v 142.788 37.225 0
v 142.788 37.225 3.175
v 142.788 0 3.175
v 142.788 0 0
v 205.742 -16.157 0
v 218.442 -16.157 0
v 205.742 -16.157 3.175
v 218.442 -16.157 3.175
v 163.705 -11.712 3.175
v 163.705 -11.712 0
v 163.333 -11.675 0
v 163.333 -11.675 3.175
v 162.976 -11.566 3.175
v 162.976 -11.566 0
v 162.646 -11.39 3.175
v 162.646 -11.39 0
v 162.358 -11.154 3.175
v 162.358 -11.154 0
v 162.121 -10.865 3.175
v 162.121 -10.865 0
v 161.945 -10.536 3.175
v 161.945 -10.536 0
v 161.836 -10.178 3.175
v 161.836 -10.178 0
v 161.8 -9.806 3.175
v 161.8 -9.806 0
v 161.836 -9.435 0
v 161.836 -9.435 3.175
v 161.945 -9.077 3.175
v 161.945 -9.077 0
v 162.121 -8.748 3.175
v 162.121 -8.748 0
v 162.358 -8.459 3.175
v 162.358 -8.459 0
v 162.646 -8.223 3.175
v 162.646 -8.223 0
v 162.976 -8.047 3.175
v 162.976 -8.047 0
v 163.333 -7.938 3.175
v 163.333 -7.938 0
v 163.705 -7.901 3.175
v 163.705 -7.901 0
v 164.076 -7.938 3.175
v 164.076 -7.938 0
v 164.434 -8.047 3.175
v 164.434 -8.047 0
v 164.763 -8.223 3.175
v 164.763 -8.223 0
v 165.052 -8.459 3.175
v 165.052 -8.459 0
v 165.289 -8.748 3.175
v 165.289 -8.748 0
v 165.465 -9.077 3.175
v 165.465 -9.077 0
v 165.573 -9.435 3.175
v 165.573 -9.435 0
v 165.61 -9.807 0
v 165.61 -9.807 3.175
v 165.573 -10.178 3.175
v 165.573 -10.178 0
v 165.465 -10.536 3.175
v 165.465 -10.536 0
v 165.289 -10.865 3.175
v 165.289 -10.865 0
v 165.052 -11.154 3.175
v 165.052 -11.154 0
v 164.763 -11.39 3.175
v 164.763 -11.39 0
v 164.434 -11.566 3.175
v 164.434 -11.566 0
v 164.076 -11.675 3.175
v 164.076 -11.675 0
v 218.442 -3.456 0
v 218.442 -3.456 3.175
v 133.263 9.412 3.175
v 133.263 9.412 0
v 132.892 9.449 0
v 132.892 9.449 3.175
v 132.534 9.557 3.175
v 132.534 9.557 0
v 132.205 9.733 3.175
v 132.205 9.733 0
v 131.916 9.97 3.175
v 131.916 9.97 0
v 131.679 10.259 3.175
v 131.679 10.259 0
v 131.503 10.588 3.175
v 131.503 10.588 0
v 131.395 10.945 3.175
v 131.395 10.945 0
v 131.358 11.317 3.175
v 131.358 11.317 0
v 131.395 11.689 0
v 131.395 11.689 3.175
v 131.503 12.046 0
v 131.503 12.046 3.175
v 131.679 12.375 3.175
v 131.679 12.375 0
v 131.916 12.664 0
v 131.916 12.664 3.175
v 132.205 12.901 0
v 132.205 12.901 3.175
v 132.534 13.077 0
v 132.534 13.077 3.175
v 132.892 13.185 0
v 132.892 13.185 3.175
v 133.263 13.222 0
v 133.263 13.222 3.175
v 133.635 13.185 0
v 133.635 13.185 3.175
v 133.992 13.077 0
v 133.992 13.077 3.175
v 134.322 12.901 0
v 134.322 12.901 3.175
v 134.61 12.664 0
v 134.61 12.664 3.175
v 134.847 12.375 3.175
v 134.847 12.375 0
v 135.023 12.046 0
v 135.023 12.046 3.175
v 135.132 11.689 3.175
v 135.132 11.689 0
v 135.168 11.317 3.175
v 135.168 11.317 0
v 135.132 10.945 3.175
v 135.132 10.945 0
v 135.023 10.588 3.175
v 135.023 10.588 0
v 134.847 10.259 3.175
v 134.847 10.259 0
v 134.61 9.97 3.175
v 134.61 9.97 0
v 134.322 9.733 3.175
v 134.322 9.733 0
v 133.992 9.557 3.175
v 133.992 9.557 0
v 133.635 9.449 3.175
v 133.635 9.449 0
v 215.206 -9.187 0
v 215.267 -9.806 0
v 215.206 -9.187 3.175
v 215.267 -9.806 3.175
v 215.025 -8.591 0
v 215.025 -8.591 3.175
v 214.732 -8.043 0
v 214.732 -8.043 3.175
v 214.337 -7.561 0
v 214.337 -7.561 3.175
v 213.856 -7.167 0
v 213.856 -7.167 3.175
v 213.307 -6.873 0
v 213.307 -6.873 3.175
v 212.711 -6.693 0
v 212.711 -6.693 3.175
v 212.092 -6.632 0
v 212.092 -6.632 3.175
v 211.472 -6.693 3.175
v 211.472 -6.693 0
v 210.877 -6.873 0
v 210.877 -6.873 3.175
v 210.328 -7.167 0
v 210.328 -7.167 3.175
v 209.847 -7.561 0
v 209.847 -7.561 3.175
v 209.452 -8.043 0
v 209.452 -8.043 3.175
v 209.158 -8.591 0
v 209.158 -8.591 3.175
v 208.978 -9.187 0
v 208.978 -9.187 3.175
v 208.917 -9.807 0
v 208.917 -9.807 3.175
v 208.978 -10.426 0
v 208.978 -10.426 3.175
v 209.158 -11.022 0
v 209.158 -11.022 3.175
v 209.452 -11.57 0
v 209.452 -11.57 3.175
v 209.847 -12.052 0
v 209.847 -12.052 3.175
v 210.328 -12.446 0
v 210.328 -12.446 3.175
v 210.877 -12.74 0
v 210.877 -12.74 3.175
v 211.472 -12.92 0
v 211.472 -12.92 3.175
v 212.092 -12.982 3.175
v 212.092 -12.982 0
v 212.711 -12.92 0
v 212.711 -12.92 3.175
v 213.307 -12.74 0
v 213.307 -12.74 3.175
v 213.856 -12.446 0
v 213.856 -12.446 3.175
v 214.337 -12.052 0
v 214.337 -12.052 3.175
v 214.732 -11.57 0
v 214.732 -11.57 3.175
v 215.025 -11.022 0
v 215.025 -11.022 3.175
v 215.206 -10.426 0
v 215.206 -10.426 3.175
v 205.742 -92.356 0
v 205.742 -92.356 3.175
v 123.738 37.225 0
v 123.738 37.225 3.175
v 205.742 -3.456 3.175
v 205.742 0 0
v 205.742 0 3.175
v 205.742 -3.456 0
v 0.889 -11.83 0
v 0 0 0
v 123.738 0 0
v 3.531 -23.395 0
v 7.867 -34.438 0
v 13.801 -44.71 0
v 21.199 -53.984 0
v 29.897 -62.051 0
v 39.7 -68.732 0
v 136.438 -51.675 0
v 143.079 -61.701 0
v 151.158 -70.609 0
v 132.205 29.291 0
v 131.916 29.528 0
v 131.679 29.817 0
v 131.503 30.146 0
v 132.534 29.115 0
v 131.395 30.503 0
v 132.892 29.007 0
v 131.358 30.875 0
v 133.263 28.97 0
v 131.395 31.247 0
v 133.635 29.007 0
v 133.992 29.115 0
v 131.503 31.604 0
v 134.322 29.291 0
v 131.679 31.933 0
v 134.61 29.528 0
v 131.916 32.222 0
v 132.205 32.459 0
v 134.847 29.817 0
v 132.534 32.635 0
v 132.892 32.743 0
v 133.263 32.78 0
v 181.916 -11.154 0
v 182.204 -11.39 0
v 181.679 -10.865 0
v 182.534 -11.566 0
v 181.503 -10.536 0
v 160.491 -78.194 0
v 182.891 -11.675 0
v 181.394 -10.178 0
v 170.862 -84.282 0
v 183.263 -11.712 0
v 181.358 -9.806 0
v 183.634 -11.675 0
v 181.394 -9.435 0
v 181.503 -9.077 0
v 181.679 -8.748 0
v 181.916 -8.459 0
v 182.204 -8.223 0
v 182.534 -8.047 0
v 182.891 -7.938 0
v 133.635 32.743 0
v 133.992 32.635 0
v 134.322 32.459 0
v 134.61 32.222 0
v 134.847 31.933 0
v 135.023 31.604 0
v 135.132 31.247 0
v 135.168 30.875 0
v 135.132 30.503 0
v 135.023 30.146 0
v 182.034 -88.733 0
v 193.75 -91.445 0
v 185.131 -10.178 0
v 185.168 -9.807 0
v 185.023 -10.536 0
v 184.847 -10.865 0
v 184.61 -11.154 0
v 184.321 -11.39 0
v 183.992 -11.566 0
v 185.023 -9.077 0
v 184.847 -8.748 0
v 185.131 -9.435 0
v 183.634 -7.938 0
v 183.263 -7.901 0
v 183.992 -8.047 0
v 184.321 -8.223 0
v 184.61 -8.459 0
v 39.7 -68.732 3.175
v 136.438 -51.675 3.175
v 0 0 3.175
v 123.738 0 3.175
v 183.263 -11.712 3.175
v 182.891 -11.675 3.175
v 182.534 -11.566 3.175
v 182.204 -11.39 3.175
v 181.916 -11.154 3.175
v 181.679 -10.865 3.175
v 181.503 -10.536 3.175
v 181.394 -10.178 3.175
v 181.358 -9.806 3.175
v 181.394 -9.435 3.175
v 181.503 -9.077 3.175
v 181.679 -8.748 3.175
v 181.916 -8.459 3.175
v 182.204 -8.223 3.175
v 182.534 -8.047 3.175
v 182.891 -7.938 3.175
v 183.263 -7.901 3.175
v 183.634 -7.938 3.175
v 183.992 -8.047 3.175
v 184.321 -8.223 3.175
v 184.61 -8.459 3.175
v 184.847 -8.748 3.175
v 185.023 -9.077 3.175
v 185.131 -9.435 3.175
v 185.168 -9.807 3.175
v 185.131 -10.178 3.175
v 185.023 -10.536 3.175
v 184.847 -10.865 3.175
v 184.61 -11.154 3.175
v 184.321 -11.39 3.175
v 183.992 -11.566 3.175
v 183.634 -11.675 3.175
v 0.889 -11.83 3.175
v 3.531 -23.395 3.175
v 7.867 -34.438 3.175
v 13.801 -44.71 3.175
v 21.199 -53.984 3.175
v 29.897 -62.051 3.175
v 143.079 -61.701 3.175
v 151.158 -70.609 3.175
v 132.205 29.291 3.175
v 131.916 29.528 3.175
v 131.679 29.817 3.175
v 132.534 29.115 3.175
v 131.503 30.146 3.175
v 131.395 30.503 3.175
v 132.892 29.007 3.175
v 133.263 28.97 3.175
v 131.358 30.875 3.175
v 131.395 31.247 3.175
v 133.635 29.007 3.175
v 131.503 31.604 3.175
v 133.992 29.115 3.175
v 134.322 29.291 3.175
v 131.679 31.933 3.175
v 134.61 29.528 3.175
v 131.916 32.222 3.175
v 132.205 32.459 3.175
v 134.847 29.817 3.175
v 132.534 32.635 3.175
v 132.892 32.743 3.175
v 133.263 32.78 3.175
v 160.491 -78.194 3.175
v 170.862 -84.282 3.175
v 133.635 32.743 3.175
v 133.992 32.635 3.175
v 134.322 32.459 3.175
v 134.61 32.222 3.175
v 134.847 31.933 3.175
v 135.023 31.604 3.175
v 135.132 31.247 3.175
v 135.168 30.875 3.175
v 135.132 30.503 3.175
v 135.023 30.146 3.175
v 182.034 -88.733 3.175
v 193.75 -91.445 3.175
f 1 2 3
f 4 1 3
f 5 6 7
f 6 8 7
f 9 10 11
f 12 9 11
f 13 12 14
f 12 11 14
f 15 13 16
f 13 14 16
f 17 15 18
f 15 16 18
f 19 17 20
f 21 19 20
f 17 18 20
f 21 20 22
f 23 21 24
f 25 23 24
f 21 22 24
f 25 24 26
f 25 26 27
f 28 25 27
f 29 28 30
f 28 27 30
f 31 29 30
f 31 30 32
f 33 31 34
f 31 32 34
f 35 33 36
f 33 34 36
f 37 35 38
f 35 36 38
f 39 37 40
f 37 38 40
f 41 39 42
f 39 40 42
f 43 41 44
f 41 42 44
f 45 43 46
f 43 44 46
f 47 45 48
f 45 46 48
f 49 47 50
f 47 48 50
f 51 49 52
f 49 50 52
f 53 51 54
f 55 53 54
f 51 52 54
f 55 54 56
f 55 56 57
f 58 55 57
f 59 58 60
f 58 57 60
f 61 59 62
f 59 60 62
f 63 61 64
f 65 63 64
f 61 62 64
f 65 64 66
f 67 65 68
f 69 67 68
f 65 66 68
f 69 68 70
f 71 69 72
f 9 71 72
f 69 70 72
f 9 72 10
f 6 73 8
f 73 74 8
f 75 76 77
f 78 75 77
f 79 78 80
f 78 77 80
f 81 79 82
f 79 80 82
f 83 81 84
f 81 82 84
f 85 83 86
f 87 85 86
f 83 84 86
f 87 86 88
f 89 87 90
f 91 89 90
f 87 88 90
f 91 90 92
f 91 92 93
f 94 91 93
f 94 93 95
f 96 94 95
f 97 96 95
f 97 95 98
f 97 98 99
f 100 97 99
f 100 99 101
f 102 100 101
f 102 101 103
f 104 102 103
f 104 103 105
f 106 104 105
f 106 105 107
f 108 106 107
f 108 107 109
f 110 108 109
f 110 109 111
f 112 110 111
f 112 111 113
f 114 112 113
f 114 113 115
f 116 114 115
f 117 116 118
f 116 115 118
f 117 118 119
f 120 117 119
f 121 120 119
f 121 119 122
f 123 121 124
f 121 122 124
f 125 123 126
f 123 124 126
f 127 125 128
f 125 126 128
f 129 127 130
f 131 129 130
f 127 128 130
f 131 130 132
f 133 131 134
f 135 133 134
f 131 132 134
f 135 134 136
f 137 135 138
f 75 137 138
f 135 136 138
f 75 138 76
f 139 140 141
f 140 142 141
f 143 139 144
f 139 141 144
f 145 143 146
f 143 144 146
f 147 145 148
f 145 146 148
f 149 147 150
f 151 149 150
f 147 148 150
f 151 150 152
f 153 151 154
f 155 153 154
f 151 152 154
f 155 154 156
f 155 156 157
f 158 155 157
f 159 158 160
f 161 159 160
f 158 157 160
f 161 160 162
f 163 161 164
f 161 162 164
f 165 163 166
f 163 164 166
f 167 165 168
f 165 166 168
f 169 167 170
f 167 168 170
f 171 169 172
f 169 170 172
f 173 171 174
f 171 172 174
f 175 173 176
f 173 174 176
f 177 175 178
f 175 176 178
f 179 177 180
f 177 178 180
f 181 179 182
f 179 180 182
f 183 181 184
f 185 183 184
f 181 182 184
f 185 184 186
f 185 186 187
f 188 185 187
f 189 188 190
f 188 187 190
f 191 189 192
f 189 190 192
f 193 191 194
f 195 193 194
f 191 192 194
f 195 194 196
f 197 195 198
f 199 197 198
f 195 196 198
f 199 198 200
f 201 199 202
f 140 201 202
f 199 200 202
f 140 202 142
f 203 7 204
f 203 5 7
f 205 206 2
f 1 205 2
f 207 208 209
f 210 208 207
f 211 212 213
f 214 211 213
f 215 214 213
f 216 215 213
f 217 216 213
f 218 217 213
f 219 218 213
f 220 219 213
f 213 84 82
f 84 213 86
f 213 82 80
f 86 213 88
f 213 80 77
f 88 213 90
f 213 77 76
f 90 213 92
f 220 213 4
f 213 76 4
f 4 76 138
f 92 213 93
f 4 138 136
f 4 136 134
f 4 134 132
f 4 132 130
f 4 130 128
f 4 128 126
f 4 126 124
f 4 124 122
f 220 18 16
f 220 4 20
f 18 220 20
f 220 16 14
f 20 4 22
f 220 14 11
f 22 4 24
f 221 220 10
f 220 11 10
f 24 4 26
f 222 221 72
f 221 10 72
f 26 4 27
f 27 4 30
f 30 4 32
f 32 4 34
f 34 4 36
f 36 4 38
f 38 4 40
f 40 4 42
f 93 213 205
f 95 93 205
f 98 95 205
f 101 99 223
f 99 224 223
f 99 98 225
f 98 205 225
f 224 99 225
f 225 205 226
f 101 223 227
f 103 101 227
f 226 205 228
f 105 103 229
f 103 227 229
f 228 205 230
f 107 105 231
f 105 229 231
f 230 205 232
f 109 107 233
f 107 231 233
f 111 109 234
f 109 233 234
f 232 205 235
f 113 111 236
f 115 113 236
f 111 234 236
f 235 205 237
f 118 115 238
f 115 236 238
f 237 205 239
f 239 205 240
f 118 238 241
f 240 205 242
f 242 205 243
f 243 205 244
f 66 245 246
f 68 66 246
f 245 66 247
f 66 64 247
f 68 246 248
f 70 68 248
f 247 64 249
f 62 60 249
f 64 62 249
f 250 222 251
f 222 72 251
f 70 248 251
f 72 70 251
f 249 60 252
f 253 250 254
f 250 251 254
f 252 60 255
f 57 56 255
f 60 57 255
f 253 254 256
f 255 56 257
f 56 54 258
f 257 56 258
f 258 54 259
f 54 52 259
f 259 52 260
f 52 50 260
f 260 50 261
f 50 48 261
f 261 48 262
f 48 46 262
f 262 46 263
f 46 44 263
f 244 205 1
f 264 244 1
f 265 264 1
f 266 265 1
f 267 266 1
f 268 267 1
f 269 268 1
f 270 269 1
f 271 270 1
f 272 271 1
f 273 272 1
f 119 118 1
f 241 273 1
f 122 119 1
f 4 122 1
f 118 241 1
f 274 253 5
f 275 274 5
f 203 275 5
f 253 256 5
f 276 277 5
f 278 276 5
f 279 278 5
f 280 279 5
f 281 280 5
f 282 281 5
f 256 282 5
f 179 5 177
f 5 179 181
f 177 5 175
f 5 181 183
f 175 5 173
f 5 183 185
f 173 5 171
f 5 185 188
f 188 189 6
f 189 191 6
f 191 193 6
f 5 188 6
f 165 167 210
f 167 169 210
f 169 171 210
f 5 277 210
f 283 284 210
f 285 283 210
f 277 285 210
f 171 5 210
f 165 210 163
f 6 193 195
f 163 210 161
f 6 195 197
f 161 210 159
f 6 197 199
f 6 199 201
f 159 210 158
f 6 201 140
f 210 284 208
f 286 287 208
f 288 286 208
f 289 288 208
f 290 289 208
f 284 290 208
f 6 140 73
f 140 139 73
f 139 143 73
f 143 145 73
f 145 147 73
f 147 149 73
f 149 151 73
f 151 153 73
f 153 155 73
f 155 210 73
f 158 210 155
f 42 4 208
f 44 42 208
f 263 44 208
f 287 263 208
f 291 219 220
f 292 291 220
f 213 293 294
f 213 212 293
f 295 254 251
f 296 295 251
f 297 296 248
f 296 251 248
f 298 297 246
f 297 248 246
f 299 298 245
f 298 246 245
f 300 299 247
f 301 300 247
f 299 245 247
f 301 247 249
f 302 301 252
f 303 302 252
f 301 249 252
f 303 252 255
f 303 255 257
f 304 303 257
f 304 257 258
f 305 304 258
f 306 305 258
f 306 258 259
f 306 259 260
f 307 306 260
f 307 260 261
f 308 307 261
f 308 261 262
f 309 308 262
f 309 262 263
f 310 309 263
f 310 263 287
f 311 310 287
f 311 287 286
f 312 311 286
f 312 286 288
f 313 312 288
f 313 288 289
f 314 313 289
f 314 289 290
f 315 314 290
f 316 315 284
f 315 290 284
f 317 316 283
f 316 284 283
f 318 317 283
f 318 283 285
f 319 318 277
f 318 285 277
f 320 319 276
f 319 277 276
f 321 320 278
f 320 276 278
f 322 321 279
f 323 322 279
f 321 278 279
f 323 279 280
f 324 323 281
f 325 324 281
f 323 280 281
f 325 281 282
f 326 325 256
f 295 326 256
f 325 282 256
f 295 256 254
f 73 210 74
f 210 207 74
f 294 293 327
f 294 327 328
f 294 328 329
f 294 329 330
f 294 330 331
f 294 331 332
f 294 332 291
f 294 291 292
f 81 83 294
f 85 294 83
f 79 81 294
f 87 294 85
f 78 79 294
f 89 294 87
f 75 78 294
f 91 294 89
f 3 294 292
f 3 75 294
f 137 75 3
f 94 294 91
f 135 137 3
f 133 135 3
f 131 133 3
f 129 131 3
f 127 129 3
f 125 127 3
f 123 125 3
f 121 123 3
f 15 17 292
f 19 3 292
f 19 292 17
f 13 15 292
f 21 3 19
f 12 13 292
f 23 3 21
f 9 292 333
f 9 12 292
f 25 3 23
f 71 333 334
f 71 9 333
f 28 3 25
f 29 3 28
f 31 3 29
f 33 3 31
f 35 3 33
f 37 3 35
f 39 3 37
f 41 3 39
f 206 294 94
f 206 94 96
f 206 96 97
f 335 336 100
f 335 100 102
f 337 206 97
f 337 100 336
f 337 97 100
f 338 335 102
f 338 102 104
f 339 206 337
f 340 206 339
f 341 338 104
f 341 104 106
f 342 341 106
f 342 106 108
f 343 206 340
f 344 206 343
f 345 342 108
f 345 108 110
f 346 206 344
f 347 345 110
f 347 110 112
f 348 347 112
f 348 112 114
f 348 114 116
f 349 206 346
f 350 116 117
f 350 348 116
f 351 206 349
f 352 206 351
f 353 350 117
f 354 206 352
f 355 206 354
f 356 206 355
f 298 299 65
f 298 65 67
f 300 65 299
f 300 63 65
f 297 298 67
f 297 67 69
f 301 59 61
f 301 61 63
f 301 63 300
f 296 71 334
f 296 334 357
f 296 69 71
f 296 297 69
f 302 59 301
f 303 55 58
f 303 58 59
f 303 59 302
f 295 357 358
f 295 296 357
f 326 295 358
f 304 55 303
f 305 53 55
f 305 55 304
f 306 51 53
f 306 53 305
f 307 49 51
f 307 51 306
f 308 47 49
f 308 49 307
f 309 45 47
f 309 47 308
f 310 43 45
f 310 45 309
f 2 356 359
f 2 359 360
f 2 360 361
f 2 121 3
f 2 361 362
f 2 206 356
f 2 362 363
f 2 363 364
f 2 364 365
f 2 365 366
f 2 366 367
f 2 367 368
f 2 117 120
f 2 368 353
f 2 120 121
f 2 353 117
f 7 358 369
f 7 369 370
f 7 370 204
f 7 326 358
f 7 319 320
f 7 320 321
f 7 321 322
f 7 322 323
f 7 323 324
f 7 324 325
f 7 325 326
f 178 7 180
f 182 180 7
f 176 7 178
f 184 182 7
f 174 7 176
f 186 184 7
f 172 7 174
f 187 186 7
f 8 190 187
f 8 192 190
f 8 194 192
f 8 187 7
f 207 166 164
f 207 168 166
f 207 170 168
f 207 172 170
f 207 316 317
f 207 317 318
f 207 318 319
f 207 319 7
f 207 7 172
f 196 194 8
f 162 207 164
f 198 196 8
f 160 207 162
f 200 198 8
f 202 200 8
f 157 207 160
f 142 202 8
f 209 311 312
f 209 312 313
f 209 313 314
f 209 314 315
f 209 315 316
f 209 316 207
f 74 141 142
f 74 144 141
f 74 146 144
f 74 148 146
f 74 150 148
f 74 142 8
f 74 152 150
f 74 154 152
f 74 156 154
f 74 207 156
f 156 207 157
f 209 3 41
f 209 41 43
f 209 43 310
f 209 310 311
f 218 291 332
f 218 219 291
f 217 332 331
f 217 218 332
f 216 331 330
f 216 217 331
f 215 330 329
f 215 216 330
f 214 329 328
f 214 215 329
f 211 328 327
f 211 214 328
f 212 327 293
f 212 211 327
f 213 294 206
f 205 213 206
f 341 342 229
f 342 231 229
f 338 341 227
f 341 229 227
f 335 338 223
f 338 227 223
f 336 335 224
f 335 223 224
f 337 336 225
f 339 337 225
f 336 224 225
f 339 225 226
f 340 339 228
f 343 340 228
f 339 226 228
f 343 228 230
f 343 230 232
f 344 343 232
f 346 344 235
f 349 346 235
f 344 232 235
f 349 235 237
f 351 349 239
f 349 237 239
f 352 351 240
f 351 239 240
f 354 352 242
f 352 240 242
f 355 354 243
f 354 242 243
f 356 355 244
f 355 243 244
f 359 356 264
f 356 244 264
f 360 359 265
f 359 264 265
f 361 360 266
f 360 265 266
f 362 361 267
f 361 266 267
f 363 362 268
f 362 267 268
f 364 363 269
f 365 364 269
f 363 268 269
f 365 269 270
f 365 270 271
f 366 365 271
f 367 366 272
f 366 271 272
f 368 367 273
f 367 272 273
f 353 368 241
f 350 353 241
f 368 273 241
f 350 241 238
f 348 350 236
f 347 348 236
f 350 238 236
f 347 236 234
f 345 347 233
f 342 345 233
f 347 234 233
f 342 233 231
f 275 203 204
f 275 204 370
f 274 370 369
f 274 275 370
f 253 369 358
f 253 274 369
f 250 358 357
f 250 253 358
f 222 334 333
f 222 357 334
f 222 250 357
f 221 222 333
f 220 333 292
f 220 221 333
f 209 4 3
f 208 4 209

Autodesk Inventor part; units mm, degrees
ref_plane "YZ Plane" through (0, 0, 0) normal (1, 0, 0) x (0, 1, 0)
ref_plane "XZ Plane" through (0, 0, 0) normal (0, 1, 0) x (-1, 0, 0)
ref_plane "XY Plane" through (0, 0, 0) normal (0, 0, 1) x (1, 0, 0)
sketch "Sketch1" plane through (0, 0, 0) normal (0, 0, 1) x (1, 0, 0)
  arc A0 (0, 0) -> (39.7002, -68.7324) centre (79.375, 0.0157) ccw
  line L0 (39.7002, -68.7324) -> (139.7567, -51.0897)
  line L1 (39.7002, -68.7324) -> (141.3002, -68.7324) construction
  arc A1 (136.4379, -51.6749) -> (205.7416, -92.3565) centre (205.743, -12.9815) ccw
  arc A2 (139.7567, -51.0897) -> (205.7416, -89.1815) centre (205.743, -12.9815) ccw
  line L2 (205.7416, -89.1815) -> (205.7416, -92.3565)
  line L3 (0, 0) -> (205.7416, 0)
  line L4 (205.7416, 0) -> (205.7416, -89.1815)
  dimension "d0" = 79.375
  dimension "d1" = 68.7324
  dimension "d2" = 39.7002
  dimension "d3" = 101.6
  dimension "d4" = 10
  dimension "d5" = 79.375
  dimension "d6" = 76.2
  dimension "d7" = 3.175
  dimension "d9" = 0
  dimension "d10" = 0
  dimension "d11" = 48.9712
extrude "Extrusion1" add sketch "Sketch1" along normal blind 3.175
sketch "Sketch2" plane through (0, 0, 3.175) normal (0, 0, 1) x (1, 0, 0)
  line L0 (205.7416, -92.3565) -> (205.7416, 0) projected
  line L1 (205.7416, -3.4565) -> (218.4416, -3.4565)
  line L2 (218.4416, -3.4565) -> (218.4416, -16.1565)
  line L3 (218.4416, -16.1565) -> (205.7416, -16.1565)
  line L4 (205.7416, -16.1565) -> (205.7416, -3.4565)
  circle A0 centre (212.0916, -9.8065) radius 3.175
  point P0 (0, 0)
  dimension "d14" = 12.7
  dimension "d15" = 12.7
  dimension "d16" = 92.3565
  dimension "d17" = 6.35
  dimension "d18" = 82.55
  dimension "d19" = 6.35
extrude "Extrusion2" add sketch "Sketch2" against normal blind 3.175
sketch "Sketch3" plane through (0, 0, 3.175) normal (0, 0, 1) x (1, 0, 0)
  circle A0 centre (212.0916, -9.8065) radius 3.175 projected
  arc A1 (0, 0) -> (39.7002, -68.7324) centre (79.375, 0.0157) ccw projected
  line L0 (39.7002, -68.7324) -> (136.4379, -51.6749) projected
  arc A2 (136.4379, -51.6749) -> (205.7416, -92.3565) centre (205.743, -12.9815) ccw projected
  line L1 (205.7416, -92.3565) -> (205.7416, -16.1565) projected
  line L2 (218.4416, -16.1565) -> (205.7416, -16.1565) projected
  line L3 (218.4416, -3.4565) -> (218.4416, -16.1565) projected
  line L4 (205.7416, -3.4565) -> (218.4416, -3.4565) projected
  line L5 (205.7416, -3.4565) -> (205.7416, 0) projected
  line L6 (205.7416, 0) -> (0, 0) projected
  line L7 (205.7416, 0) -> (0, 0) projected
  line L8 (142.7882, 0) -> (123.7382, 0)
  line L9 (123.7382, 0) -> (123.7382, 37.2251)
  line L10 (123.7382, 37.2251) -> (142.7882, 37.2251)
  line L11 (142.7882, 37.2251) -> (142.7882, 0)
  dimension "d22" = 19.05
  dimension "d23" = 88.9
  dimension "d25" = 47.0315
  dimension "d26" = 69.3034
extrude "Extrusion3" add sketch "Sketch3" against normal blind 3.175 contours L9 L10 L11 L6
sketch "Sketch4" plane through (0, 0, 3.175) normal (0, 0, 1) x (1, 0, 0)
  circle A0 centre (212.0916, -9.8065) radius 3.175 projected
  arc A1 (0, 0) -> (39.7002, -68.7324) centre (79.375, 0.0157) ccw projected
  line L0 (39.7002, -68.7324) -> (136.4379, -51.6749) projected
  arc A2 (136.4379, -51.6749) -> (205.7416, -92.3565) centre (205.743, -12.9815) ccw projected
  line L1 (205.7416, -92.3565) -> (205.7416, -16.1565) projected
  line L2 (218.4416, -16.1565) -> (205.7416, -16.1565) projected
  line L3 (218.4416, -3.4565) -> (218.4416, -16.1565) projected
  line L4 (205.7416, -3.4565) -> (218.4416, -3.4565) projected
  line L5 (205.7416, -3.4565) -> (205.7416, 0) projected
  line L6 (205.7416, 0) -> (142.7882, 0) projected
  line L7 (142.7882, 0) -> (142.7882, 37.2251) projected
  line L8 (142.7882, 37.2251) -> (123.7382, 37.2251) projected
  line L9 (123.7382, 37.2251) -> (123.7382, 0) projected
  line L10 (123.7382, 0) -> (0, 0) projected
  point P0 (133.2632, 30.8751)
  point P1 (133.2632, 11.3171)
  point P2 (183.2626, -9.8065)
  point P3 (163.7046, -9.8065)
  dimension "d29" = 9.525
  dimension "d30" = 6.35
  dimension "d31" = 19.558
  dimension "d32" = 9.525
  dimension "d33" = 28.829
  dimension "d35" = 0
  dimension "d36" = 0
  dimension "d44" = 19.558
hole "Hole1" at (133.2632, 30.8751, 3.175) at (133.2632, 11.3171, 3.175) at (183.2626, -9.8065, 3.175) at (163.7046, -9.8065, 3.175) direction (0, 0, -1) diameter 3.81 end through all
equation "\"d19\" = 0.5 * d15"
equation "\"d32\" = d29"
properties part number "CollectionCasing"
